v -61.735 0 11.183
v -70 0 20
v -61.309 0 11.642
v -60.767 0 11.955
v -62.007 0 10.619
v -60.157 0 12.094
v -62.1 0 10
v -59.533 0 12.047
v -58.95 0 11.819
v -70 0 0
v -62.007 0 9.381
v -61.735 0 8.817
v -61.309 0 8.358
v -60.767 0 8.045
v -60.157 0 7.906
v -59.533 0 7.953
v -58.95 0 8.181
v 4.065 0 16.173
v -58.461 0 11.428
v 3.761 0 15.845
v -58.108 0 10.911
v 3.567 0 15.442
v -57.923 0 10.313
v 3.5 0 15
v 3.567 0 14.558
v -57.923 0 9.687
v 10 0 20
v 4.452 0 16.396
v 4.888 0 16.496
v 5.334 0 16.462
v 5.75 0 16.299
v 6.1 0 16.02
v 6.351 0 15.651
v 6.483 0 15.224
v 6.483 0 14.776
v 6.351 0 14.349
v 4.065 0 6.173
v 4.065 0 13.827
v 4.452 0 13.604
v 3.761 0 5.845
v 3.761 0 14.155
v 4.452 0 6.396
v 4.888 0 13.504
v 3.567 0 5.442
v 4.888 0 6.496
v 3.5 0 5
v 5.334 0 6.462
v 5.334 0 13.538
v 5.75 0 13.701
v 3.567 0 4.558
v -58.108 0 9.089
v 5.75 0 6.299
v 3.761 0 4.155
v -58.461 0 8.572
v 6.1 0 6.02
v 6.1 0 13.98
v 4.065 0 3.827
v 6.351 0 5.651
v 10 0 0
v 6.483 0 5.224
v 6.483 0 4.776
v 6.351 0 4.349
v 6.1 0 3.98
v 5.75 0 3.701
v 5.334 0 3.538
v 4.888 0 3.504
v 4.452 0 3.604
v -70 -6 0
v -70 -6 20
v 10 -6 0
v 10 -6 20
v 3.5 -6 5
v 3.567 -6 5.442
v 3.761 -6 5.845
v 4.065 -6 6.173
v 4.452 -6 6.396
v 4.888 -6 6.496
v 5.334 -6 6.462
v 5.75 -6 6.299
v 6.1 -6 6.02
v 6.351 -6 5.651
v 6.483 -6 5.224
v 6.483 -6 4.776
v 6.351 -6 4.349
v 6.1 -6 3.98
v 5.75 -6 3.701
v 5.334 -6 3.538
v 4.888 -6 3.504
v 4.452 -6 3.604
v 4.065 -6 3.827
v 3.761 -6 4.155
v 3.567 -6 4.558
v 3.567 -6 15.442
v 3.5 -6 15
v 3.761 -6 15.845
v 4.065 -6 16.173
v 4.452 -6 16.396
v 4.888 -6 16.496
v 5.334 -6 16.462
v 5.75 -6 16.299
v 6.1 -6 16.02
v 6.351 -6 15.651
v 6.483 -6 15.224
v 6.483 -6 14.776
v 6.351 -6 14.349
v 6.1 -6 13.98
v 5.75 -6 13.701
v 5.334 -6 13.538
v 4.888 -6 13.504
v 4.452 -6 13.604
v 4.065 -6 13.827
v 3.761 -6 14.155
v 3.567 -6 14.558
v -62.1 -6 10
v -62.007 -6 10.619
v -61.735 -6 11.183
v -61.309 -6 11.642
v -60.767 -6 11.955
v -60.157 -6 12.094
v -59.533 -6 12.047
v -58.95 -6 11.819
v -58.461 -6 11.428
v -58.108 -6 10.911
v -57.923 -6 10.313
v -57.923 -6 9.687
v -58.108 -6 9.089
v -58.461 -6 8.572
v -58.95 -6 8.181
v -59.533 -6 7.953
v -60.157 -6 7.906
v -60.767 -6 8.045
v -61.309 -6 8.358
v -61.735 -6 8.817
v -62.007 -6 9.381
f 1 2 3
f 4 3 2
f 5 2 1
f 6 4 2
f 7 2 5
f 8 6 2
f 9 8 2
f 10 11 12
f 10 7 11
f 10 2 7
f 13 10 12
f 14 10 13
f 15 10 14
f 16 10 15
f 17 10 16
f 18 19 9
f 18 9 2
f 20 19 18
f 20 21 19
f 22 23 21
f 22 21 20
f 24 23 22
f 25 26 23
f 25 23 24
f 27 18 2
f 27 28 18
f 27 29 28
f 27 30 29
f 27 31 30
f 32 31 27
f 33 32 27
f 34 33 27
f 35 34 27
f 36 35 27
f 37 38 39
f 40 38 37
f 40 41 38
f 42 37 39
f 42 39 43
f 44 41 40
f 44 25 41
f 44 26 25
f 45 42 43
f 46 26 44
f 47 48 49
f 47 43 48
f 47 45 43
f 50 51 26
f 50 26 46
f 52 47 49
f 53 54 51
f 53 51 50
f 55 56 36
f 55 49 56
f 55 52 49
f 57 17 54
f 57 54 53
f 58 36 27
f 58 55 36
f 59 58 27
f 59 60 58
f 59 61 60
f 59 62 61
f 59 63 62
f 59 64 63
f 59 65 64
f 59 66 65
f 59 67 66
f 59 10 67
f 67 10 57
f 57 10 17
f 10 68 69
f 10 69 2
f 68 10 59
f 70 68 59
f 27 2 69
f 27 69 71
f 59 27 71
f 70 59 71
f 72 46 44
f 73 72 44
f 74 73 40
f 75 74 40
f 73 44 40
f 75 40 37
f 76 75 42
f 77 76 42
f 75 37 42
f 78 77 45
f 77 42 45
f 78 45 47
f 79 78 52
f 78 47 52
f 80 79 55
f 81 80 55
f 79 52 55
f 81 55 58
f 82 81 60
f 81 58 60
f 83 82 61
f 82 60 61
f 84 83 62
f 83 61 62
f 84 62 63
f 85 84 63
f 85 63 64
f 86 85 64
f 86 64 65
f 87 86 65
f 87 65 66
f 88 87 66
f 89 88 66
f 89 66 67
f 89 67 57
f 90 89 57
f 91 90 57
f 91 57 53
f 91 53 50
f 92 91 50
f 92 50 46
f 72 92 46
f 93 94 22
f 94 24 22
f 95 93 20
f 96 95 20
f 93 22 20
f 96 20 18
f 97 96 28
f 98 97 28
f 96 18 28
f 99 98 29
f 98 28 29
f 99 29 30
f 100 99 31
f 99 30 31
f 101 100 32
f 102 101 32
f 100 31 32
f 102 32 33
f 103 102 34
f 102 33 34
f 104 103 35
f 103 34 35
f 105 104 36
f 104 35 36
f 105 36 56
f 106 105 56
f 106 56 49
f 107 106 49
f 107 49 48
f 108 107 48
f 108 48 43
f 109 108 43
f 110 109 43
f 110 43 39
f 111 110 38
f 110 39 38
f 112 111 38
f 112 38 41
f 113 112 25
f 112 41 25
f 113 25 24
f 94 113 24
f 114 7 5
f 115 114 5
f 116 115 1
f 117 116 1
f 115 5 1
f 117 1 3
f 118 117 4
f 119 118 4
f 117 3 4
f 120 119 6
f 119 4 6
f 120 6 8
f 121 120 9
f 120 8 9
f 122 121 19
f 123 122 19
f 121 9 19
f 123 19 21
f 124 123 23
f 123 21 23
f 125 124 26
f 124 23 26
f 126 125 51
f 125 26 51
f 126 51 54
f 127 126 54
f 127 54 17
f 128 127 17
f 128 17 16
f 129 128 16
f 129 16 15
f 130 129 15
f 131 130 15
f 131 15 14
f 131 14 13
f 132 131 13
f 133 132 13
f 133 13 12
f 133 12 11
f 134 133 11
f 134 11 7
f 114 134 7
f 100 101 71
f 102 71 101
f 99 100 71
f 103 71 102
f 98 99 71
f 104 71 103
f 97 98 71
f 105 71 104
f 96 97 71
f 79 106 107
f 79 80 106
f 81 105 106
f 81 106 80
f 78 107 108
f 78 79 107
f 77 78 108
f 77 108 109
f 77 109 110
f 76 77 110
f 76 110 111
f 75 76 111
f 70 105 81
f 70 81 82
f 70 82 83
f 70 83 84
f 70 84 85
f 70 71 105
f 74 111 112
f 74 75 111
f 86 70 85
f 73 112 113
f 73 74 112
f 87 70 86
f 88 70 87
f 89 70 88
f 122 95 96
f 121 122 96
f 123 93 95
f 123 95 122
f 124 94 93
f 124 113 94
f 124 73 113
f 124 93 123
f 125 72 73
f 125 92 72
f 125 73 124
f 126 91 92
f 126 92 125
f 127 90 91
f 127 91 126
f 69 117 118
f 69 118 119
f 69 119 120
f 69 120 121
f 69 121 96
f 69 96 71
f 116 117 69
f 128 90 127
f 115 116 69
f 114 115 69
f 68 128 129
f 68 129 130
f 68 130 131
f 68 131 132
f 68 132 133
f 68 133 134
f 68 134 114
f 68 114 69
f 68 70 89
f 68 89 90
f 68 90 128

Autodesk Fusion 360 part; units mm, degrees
sketch "スケッチ1" plane through (0, 0, 0) normal (0, 0, 1) x (1, 0, 0)
  line L0 (10, -10) -> (-70, -10)
  line L1 (-70, -10) -> (-70, 0)
  line L2 (-70, 0) -> (10, 0)
  line L3 (10, 0) -> (10, -10)
extrude "押し出し1" add sketch "スケッチ1" along normal blind 20
sketch "スケッチ2" plane through (0, 0, 0) normal (0, 1, 0) x (-1, 0, 0)
  line L0 (-10, 0) -> (70, 0)
  line L1 (70, 0) -> (70, 20)
  line L2 (70, 20) -> (-10, 20)
  line L3 (-10, 20) -> (-10, 0)
  circle A0 centre (60, 10) radius 2.1
extrude "押し出し2" cut sketch "スケッチ2" against normal blind 10 contours A0
extrude "押し出し3" cut 1 faces at (-12.6333, -10, 10) along direction (0, 1, 0) blind 4
sketch "スケッチ3" plane through (0, 0, 0) normal (0, 1, 0) x (-1, 0, 0)
  circle A0 centre (60, 10) radius 2.1
  line L0 (-10, 0) -> (70, 0)
  line L1 (70, 0) -> (70, 20)
  line L2 (70, 20) -> (-10, 20)
  line L3 (-10, 20) -> (-10, 0)
  circle A1 centre (-5, 15) radius 1.5
  circle A2 centre (-5, 5) radius 1.5
extrude "押し出し4" cut sketch "スケッチ3" against normal blind 6 contours A1 | A2
